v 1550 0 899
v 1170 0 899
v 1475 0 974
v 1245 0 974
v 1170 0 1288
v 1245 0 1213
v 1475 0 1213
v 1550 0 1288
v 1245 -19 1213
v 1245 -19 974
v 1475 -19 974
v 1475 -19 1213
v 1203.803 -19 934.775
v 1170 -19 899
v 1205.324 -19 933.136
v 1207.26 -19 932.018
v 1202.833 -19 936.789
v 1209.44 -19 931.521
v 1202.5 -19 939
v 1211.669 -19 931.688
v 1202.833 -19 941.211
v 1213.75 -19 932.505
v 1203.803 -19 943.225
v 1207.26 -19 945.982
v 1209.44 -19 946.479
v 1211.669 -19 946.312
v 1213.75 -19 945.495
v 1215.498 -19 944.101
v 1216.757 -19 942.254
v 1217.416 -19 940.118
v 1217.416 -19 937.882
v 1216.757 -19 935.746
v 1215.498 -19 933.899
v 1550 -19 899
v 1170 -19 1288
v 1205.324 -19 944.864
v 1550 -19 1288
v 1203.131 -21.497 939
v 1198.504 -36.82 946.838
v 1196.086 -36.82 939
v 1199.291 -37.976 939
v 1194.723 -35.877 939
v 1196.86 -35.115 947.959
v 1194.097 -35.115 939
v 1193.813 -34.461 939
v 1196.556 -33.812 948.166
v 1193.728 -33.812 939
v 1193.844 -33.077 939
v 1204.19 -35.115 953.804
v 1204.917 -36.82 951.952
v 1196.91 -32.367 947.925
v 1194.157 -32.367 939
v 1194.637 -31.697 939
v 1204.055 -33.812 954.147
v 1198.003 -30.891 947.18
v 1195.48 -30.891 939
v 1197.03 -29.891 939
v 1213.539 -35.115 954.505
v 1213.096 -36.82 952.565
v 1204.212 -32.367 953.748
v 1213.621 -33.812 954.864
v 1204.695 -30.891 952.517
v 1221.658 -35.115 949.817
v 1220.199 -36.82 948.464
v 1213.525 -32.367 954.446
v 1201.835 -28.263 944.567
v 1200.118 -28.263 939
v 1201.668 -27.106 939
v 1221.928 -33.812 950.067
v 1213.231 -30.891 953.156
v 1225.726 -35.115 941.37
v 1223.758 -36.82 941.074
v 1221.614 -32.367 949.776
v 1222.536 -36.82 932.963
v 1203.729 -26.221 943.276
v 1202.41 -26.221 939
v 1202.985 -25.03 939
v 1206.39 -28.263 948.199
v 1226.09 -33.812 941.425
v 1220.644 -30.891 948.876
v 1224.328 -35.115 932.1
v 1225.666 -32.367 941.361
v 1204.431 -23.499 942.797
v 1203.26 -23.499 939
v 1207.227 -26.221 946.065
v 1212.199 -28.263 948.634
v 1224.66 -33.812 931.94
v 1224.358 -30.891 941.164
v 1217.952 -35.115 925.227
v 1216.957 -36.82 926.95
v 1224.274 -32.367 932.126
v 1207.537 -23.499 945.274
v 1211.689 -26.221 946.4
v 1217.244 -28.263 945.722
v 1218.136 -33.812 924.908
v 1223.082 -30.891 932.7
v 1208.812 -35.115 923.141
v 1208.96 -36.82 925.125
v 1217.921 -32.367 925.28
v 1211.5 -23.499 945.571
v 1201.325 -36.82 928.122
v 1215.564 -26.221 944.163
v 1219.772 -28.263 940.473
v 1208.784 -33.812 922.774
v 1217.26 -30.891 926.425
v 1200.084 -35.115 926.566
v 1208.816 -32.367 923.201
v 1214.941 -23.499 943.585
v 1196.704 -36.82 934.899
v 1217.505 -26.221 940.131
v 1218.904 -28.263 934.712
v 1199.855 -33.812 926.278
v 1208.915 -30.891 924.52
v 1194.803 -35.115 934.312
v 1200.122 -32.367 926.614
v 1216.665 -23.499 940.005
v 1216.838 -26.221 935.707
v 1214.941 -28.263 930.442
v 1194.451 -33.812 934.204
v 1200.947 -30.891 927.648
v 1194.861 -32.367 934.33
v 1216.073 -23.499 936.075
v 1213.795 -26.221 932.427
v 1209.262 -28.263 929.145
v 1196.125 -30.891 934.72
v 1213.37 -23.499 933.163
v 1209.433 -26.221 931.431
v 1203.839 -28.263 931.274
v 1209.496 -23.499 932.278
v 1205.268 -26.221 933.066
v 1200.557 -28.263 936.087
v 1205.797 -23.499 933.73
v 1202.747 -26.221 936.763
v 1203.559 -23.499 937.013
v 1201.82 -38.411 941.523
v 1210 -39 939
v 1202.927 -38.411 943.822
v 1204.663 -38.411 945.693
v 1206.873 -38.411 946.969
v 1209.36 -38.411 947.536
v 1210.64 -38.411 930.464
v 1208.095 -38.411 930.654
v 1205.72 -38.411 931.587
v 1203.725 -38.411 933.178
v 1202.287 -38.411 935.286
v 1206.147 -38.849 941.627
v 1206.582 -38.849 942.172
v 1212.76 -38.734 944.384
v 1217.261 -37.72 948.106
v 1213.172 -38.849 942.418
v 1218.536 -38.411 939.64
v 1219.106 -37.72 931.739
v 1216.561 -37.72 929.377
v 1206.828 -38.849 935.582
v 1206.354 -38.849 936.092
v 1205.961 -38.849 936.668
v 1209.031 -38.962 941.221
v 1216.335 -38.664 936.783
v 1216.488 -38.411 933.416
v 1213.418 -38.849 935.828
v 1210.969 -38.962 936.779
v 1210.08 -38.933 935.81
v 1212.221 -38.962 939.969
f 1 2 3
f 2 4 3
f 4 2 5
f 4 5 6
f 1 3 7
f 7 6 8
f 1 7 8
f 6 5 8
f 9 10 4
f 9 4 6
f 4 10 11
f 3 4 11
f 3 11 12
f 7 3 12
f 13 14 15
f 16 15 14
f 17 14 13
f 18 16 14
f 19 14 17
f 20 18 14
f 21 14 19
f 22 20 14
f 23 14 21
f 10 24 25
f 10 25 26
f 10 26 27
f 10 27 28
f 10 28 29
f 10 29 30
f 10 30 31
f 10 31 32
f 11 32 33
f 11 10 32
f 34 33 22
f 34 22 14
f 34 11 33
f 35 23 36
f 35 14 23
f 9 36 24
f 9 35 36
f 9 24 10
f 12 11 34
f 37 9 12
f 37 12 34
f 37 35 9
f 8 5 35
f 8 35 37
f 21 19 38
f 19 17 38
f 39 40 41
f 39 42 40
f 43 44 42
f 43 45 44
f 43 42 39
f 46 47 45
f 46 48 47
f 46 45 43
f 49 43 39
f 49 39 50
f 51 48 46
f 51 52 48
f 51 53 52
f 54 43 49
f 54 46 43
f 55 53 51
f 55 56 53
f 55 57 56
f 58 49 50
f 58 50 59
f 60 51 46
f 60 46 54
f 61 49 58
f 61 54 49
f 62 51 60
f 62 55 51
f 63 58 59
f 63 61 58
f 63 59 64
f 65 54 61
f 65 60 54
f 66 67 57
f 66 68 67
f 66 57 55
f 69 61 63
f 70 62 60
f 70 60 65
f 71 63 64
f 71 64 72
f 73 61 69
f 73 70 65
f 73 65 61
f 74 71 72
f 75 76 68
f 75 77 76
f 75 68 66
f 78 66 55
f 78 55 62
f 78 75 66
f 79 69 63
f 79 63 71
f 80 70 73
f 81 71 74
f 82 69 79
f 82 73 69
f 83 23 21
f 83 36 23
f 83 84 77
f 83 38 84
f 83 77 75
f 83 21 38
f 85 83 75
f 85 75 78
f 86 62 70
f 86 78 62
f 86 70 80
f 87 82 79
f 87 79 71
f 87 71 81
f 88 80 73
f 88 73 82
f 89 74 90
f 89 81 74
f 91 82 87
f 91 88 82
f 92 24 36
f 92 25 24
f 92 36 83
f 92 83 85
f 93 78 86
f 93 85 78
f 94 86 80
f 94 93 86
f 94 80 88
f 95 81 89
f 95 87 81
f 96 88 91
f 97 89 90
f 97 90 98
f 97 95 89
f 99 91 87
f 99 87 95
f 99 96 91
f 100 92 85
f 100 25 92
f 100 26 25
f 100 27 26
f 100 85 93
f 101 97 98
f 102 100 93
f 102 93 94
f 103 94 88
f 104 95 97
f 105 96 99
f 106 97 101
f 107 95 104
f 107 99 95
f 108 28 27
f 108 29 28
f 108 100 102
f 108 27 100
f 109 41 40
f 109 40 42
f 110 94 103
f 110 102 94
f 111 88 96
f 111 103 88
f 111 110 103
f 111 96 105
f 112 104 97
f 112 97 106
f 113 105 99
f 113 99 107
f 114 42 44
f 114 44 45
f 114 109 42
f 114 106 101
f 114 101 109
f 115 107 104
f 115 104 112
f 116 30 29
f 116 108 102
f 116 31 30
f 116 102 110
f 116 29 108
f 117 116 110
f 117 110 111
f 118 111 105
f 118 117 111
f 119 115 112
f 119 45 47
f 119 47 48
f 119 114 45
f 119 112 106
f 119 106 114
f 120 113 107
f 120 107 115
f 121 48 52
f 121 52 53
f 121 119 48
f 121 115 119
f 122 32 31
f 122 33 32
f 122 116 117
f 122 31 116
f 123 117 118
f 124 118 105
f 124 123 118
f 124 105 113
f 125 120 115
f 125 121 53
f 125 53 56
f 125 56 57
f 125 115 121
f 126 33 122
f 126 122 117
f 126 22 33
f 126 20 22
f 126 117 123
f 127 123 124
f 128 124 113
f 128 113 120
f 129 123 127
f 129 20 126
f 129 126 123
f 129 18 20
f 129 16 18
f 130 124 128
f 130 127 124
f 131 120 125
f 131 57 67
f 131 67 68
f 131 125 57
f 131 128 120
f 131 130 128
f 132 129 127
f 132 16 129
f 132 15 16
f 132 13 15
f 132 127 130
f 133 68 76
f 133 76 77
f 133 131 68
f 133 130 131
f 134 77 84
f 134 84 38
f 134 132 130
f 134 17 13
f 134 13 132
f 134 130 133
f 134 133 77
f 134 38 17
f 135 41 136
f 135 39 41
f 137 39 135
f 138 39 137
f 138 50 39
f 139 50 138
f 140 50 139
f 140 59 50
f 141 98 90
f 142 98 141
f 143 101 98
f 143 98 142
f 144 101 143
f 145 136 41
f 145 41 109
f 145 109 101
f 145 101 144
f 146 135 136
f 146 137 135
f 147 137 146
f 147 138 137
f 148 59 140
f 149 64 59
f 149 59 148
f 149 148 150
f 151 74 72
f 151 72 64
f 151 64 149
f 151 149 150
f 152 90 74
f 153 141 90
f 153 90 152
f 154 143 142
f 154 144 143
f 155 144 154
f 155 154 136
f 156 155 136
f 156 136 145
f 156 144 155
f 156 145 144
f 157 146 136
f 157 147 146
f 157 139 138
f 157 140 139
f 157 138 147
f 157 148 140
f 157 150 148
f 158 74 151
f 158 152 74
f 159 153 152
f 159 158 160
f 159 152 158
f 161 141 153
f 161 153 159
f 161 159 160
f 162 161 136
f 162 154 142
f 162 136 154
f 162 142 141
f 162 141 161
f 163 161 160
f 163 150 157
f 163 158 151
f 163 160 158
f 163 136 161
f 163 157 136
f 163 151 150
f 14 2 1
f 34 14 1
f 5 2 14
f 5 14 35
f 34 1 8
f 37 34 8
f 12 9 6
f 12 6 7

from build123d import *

# Parameters (mm, degrees)
CLONE2D011_W = 380
CLONE2D011_H = 389
PAD_DEPTH    = 19
SKETCH_W     = 230
SKETCH_H     = 239
POCKET_DEPTH = 19.001


with BuildPart() as part:
    # Clone2D011 → Pad (new body)
    with BuildSketch(Plane.XZ):
        with Locations((190, 194.5)):
            Rectangle(CLONE2D011_W, CLONE2D011_H)
    extrude(amount=PAD_DEPTH)

    # Clone2D010 → Revolution006 (revolve)
    with BuildSketch(Plane(origin=(40, -19, 40), x_dir=(1, 0, 0), z_dir=(0, 0, 1))):
        with BuildLine():
            Line((0, 0), (0, -20))
            add(Edge.make_bspline(
                [(0, -20), (-18, -20), (-18, -9.133286), (-4.506424, -9.133286), (-7.5, 0)],
                knots=[0, 0, 0, 0, 0.5, 1, 1, 1, 1], degree=3, weights=[7, 6.116989, 5.810816, 6.060123, 5.999522]))
            Line((-7.5, 0), (0, 0))
        make_face()
    revolve(axis=Axis((40, -19, 40), (0, 1, 0)))

    # Sketch (on Face5 of Revolution006) → Pocket (cut, through all)
    with BuildSketch(Plane.XZ.offset(19)):
        with Locations((190, 194.5)):
            Rectangle(SKETCH_W, SKETCH_H)
    extrude(amount=-POCKET_DEPTH, mode=Mode.SUBTRACT)


with BuildPart() as part_1:
    # Body placement: moved
    add(part.part.moved(Location((395.5, 0, 899))))


with BuildPart() as part_2:
    # Clone002 placement: moved
    add(part_1.part.moved(Location((-395.5, 0, -899))))


with BuildPart() as part_3:
    # Body016 placement: moved
    add(part_2.part.moved(Location((1170, 0, 899))))


solid = part_3.part
